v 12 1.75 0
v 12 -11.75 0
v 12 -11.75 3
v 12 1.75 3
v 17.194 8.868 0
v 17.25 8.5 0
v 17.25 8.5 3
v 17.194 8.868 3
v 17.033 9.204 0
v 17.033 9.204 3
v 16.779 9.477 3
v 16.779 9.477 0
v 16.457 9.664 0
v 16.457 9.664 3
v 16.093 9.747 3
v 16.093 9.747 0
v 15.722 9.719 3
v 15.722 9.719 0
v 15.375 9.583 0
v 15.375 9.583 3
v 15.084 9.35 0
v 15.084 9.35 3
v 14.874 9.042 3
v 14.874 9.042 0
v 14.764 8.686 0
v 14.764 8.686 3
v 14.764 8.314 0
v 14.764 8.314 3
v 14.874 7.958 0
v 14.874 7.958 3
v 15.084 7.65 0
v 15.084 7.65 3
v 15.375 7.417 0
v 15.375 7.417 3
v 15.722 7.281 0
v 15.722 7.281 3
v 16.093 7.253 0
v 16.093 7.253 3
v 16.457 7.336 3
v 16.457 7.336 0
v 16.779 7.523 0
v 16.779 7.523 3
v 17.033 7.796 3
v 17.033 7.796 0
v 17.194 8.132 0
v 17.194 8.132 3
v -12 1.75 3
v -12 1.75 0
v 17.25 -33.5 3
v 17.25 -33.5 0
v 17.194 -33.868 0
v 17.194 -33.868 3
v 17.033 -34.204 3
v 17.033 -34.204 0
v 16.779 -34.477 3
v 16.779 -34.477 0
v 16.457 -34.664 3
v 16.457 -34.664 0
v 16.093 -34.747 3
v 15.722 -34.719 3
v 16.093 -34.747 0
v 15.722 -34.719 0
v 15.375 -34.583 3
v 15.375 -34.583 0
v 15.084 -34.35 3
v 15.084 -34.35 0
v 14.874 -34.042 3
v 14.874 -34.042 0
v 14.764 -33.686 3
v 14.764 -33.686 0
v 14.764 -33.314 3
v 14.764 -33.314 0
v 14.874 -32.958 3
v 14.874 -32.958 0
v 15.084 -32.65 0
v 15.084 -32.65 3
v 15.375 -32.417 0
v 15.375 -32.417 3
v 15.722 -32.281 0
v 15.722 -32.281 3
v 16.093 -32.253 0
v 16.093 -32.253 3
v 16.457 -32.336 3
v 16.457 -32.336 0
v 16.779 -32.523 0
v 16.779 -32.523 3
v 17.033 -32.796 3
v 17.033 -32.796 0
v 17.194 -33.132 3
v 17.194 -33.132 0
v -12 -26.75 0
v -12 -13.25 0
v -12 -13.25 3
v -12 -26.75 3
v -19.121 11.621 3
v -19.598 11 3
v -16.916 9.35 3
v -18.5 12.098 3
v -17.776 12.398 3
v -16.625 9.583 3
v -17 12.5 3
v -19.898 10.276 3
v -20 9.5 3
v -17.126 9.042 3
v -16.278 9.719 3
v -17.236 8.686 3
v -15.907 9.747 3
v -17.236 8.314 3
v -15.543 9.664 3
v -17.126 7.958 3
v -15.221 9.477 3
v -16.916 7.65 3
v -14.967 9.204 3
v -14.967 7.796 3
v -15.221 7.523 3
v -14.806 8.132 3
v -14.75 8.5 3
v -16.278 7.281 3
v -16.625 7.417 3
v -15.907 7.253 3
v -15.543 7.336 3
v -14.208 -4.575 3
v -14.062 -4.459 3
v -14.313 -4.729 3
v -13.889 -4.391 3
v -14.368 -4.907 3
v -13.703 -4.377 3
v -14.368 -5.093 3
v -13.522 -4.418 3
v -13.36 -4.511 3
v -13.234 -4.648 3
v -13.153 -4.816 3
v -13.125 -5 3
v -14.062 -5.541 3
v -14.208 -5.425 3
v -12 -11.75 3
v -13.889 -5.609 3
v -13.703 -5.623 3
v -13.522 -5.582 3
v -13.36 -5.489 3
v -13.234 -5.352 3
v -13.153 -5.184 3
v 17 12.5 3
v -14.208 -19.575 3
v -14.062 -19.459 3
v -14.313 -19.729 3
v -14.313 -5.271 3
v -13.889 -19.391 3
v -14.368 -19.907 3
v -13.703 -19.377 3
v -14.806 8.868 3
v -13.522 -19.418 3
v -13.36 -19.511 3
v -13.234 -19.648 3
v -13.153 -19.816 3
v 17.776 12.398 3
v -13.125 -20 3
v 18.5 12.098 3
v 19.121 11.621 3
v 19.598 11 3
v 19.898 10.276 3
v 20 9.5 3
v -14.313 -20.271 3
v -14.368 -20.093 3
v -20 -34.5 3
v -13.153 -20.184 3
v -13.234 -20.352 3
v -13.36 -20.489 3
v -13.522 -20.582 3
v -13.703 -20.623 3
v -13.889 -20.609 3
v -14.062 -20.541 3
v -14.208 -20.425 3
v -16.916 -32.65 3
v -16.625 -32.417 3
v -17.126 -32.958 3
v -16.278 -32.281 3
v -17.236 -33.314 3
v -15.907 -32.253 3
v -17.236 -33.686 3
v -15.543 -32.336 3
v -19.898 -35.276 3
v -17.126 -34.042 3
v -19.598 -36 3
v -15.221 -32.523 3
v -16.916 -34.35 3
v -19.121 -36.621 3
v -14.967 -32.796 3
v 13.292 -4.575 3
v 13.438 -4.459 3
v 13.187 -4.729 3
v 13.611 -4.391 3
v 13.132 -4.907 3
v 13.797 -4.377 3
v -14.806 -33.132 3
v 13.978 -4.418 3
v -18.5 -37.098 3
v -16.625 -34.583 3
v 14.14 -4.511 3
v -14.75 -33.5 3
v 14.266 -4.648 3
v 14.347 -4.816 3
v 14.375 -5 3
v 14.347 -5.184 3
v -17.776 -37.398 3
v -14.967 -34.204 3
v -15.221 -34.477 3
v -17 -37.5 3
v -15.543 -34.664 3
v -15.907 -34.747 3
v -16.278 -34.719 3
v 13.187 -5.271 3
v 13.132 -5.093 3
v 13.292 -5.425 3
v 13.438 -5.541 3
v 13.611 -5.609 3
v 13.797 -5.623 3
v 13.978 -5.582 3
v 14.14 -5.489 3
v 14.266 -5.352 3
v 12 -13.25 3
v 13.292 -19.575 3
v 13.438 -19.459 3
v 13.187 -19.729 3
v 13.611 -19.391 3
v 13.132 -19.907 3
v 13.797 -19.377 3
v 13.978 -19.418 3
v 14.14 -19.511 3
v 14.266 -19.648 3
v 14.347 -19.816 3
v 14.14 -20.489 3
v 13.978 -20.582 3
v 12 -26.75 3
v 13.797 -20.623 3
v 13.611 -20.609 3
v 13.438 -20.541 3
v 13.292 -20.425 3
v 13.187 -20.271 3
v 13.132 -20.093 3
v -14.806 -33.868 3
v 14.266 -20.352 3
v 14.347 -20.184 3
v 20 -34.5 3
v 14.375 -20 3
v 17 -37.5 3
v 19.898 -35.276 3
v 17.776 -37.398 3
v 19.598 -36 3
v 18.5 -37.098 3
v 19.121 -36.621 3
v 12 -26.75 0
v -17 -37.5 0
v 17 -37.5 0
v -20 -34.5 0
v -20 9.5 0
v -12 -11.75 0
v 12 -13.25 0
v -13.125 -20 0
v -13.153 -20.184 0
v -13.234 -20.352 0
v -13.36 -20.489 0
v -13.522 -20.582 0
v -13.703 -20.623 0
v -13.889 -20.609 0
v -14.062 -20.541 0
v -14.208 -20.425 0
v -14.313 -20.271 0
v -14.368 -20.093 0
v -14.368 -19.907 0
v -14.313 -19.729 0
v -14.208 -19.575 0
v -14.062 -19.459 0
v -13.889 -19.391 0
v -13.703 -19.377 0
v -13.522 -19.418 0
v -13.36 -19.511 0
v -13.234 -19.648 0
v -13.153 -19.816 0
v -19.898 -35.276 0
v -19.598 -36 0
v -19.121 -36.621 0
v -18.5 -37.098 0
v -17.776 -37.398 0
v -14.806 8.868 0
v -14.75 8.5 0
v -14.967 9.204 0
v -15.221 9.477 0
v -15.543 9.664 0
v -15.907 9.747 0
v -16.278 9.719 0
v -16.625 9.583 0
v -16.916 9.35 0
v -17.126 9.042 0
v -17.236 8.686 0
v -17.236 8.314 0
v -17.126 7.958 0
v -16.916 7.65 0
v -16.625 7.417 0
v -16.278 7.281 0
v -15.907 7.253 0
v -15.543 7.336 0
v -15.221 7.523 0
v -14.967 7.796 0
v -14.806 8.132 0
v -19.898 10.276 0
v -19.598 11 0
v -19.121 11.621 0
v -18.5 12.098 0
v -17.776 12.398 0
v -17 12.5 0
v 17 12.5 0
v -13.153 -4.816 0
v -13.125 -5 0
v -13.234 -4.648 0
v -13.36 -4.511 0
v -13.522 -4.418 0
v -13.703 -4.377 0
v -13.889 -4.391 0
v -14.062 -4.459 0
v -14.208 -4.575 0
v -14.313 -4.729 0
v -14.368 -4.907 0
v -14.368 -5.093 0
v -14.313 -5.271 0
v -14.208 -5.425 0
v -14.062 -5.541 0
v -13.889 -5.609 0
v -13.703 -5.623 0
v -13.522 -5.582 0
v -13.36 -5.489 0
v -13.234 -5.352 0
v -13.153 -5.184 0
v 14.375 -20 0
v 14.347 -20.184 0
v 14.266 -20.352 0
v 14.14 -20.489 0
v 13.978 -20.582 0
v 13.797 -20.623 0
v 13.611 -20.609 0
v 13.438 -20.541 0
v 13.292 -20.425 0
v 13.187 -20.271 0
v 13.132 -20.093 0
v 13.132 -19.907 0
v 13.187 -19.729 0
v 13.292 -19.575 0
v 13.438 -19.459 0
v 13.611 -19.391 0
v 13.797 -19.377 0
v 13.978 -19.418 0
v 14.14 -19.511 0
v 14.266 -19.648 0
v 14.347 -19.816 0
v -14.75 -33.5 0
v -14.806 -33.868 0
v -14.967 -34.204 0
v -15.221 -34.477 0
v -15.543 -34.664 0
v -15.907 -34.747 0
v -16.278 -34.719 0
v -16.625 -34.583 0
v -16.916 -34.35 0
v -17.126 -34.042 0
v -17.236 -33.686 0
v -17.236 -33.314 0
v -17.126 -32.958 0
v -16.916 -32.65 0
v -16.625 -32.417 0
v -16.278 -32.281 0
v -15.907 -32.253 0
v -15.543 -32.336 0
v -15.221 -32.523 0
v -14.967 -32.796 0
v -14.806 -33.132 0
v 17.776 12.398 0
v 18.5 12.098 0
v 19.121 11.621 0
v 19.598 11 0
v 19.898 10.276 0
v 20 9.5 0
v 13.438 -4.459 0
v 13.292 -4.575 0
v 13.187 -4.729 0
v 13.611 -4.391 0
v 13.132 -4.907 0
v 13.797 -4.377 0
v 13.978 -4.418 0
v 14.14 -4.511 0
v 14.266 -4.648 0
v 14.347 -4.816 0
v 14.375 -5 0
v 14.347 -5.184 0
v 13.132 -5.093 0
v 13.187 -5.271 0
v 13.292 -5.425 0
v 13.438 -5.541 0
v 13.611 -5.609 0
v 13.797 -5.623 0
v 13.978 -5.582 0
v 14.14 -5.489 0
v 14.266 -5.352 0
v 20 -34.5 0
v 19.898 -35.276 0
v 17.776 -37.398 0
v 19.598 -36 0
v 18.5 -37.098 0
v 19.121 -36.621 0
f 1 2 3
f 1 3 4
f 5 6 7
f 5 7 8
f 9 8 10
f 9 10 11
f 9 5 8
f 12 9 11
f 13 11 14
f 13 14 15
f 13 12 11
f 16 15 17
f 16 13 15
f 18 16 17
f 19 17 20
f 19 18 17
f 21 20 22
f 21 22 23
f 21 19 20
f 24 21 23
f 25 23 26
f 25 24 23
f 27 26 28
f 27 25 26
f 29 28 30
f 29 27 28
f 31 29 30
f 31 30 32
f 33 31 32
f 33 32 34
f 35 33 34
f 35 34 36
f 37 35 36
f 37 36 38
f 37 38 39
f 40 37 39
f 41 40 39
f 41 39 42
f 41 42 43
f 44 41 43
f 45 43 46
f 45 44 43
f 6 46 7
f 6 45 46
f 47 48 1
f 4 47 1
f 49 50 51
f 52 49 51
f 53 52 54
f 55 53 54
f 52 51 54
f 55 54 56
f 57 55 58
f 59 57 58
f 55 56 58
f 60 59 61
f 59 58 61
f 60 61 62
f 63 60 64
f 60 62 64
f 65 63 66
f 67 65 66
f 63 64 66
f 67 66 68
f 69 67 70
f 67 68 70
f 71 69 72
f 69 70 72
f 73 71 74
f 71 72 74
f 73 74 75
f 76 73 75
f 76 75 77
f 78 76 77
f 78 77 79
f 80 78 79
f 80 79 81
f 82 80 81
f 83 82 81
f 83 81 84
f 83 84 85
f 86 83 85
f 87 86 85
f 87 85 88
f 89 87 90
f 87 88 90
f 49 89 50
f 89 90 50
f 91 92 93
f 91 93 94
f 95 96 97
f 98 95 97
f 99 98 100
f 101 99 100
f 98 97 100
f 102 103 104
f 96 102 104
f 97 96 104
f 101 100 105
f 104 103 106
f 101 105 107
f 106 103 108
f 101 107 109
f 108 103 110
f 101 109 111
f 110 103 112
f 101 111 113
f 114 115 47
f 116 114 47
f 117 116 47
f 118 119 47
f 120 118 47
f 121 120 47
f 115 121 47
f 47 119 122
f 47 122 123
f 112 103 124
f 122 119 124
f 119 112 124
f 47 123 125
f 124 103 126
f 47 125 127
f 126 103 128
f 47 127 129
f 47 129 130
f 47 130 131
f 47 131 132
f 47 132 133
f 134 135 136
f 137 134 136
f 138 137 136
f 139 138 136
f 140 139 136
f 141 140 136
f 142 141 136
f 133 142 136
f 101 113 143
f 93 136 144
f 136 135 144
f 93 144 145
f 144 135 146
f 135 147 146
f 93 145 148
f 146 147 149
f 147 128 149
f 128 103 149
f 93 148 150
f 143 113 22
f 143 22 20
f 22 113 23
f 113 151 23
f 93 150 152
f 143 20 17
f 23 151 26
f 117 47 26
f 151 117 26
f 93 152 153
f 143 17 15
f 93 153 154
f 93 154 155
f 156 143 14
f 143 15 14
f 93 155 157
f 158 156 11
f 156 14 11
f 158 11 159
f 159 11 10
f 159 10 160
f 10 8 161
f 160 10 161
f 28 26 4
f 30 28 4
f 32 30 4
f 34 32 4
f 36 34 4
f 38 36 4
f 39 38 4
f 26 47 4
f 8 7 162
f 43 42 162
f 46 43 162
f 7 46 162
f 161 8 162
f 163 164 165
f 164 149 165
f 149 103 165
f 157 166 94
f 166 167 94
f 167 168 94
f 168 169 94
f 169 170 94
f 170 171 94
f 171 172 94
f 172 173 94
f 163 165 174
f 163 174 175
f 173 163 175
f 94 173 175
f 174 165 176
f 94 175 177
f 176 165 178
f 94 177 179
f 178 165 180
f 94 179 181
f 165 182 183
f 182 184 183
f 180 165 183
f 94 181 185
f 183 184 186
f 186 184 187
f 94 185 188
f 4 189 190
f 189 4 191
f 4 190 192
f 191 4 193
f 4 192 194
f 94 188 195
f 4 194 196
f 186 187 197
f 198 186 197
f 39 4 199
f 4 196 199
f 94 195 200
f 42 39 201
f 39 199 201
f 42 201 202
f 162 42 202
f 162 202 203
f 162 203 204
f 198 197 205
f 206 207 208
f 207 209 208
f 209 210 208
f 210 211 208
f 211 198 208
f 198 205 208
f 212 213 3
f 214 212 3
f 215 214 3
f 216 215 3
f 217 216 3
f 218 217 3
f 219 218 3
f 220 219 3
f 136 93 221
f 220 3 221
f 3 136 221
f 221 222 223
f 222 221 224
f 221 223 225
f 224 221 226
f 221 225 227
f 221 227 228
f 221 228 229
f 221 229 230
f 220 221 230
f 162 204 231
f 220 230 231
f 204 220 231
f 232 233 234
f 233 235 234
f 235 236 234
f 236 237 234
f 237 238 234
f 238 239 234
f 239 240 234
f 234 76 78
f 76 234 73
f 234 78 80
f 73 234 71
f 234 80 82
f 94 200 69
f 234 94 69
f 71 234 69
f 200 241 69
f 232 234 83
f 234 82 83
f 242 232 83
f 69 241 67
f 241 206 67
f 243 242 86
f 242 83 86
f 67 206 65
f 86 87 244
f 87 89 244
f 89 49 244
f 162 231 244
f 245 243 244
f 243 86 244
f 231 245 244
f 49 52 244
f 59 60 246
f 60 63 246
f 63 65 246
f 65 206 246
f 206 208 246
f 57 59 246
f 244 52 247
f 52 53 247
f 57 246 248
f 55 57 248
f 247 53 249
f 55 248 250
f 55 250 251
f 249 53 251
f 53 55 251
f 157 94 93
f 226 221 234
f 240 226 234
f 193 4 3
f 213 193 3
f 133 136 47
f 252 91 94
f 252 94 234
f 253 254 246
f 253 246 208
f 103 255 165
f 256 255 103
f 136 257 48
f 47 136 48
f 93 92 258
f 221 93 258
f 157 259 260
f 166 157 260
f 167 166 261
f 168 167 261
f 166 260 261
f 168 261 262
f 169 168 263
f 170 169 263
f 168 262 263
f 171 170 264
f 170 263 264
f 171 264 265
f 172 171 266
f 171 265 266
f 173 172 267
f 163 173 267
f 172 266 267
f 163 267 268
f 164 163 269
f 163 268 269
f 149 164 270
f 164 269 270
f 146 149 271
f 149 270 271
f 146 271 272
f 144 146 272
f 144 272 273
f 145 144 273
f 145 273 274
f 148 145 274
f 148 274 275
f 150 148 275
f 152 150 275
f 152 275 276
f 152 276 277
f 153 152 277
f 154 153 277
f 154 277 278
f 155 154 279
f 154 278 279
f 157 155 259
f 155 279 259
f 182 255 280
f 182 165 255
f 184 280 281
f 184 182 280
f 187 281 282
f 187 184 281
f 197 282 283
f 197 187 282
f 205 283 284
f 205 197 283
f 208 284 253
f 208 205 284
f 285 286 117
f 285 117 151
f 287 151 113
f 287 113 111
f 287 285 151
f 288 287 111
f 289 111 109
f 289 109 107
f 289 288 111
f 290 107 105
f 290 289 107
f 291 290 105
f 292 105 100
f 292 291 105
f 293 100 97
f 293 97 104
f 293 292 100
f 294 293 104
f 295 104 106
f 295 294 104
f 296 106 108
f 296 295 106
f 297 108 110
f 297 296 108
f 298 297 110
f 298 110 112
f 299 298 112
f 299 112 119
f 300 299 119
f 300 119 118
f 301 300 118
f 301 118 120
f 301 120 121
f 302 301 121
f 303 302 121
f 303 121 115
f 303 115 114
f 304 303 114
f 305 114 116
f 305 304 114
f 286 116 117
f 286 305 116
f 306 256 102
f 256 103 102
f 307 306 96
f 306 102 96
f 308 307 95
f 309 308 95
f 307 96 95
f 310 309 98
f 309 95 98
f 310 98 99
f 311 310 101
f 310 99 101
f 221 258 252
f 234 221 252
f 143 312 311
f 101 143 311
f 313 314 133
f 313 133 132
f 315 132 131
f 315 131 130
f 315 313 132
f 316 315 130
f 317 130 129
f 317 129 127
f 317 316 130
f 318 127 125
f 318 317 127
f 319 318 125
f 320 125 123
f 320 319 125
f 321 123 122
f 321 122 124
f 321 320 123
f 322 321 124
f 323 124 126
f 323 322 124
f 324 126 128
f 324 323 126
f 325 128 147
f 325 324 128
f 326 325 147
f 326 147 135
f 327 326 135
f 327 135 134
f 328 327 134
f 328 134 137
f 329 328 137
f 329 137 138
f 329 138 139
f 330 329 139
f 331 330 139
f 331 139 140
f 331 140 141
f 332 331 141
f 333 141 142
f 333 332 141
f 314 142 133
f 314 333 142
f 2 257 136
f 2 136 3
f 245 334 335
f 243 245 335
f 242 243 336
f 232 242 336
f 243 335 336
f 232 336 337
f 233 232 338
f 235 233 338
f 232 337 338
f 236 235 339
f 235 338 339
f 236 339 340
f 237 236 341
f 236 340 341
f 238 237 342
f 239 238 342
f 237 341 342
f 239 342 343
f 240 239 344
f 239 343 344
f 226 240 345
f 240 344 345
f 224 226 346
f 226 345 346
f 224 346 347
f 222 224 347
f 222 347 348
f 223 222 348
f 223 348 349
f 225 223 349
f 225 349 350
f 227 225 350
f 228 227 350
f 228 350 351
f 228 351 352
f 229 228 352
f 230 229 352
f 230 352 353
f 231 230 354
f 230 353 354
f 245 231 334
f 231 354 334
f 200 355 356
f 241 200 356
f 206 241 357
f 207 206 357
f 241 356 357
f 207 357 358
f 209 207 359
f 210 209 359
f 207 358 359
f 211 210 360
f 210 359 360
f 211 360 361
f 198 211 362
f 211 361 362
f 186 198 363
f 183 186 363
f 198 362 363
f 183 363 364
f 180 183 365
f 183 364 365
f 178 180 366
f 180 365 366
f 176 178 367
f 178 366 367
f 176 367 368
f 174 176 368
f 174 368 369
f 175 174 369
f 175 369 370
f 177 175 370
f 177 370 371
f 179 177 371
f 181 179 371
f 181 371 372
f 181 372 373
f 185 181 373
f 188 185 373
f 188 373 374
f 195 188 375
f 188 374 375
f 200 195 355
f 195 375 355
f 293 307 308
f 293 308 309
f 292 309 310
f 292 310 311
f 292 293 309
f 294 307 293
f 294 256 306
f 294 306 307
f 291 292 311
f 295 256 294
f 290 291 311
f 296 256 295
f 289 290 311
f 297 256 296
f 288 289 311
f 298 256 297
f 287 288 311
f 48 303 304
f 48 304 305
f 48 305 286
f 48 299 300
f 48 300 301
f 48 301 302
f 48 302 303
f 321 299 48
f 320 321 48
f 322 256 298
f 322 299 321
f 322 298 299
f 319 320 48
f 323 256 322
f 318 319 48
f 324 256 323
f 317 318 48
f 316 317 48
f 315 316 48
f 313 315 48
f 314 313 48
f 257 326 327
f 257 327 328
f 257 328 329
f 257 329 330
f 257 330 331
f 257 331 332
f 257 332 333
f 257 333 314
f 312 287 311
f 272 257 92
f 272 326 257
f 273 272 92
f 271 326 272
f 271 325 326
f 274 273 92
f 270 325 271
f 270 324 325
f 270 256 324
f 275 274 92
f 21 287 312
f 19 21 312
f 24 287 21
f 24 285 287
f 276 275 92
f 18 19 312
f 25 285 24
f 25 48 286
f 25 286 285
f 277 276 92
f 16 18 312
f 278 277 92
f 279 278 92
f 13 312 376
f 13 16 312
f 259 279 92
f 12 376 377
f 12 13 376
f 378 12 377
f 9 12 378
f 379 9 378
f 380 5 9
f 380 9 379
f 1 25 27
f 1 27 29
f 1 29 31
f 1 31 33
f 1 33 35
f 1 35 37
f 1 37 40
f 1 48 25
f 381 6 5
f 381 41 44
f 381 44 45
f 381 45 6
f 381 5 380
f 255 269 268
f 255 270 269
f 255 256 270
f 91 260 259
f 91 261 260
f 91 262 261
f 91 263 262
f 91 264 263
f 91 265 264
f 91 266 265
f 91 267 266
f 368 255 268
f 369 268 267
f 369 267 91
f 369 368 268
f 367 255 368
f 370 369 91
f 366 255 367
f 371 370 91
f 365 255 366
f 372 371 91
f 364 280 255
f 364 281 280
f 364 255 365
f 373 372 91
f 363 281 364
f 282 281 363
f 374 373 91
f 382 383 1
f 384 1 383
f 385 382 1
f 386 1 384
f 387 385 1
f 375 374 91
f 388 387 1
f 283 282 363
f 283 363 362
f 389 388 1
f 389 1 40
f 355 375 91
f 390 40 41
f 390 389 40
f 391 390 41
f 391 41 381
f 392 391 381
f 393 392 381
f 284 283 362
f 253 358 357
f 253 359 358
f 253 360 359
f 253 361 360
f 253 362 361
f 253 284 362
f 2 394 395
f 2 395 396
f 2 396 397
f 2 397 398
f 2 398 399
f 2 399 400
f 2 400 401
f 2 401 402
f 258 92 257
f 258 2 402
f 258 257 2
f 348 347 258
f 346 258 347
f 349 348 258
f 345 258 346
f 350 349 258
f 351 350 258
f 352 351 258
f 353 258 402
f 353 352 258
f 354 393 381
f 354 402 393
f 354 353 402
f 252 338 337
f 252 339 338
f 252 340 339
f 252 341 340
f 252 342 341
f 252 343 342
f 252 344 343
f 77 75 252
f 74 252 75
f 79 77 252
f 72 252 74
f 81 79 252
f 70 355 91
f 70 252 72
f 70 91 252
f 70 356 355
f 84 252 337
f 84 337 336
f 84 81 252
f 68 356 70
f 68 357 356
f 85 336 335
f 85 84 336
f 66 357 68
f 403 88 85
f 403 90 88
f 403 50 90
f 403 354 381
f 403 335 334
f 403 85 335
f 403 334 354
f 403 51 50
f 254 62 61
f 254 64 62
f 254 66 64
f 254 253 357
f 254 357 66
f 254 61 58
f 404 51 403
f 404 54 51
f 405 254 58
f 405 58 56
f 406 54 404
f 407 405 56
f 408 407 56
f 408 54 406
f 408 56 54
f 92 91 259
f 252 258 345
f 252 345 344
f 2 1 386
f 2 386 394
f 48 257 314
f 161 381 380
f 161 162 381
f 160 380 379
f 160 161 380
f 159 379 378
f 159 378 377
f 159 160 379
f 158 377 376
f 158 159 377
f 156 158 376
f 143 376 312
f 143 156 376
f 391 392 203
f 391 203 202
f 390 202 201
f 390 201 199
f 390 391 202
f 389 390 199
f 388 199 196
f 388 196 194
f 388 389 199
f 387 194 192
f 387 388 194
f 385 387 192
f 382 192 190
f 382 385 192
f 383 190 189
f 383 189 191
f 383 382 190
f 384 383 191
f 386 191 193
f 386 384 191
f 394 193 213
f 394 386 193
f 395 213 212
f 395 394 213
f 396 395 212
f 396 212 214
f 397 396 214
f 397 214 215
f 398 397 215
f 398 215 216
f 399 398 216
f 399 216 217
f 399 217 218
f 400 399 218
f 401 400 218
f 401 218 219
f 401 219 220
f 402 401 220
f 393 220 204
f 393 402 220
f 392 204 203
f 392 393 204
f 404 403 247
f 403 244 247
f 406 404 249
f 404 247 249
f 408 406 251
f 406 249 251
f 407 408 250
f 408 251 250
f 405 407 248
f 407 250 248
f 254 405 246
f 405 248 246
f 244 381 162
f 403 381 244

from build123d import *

# Parameters (mm, degrees)
F0_R     = 0.625
F0_W     = 24
F0_H     = 13.5
F0_R_2   = 1.25
F1_DEPTH = 3
F3_R     = 3


with BuildPart() as f1:
    # F0 (on Top) → F1 (new body)
    with BuildSketch(Plane.XY):
        Polygon((20, -12.5), (20, 12.5), (16, 12.5), (-20, 12.5), (-20, -12.5), align=None)
        with Locations((-13.75, -5)):
            Circle(F0_R, mode=Mode.SUBTRACT)
        with Locations((0, -5)):
            Rectangle(F0_W, F0_H, mode=Mode.SUBTRACT)
        with Locations((13.75, -5)):
            Circle(F0_R, mode=Mode.SUBTRACT)
        with Locations((-16, 8.5)):
            Circle(F0_R_2, mode=Mode.SUBTRACT)
        with Locations((16, 8.5)):
            Circle(F0_R_2, mode=Mode.SUBTRACT)
    extrude(amount=F1_DEPTH)

    # F2: F1 across face


with BuildPart() as f1_1:
    add(f1.part)
    add(f1.part.mirror(Plane(origin=(0, -12.5, 1.5), x_dir=(1, 0, 0), z_dir=(0, -1, 0))))

    # F3
    f3_edges = [f1_1.edges().sort_by_distance(p)[0] for p in [
        (-20, -37.5, 1.5),
        (20, -37.5, 1.5),
        (20, 12.5, 1.5),
        (-20, 12.5, 1.5),
    ]]
    fillet(f3_edges, radius=F3_R)


solid = f1_1.part
